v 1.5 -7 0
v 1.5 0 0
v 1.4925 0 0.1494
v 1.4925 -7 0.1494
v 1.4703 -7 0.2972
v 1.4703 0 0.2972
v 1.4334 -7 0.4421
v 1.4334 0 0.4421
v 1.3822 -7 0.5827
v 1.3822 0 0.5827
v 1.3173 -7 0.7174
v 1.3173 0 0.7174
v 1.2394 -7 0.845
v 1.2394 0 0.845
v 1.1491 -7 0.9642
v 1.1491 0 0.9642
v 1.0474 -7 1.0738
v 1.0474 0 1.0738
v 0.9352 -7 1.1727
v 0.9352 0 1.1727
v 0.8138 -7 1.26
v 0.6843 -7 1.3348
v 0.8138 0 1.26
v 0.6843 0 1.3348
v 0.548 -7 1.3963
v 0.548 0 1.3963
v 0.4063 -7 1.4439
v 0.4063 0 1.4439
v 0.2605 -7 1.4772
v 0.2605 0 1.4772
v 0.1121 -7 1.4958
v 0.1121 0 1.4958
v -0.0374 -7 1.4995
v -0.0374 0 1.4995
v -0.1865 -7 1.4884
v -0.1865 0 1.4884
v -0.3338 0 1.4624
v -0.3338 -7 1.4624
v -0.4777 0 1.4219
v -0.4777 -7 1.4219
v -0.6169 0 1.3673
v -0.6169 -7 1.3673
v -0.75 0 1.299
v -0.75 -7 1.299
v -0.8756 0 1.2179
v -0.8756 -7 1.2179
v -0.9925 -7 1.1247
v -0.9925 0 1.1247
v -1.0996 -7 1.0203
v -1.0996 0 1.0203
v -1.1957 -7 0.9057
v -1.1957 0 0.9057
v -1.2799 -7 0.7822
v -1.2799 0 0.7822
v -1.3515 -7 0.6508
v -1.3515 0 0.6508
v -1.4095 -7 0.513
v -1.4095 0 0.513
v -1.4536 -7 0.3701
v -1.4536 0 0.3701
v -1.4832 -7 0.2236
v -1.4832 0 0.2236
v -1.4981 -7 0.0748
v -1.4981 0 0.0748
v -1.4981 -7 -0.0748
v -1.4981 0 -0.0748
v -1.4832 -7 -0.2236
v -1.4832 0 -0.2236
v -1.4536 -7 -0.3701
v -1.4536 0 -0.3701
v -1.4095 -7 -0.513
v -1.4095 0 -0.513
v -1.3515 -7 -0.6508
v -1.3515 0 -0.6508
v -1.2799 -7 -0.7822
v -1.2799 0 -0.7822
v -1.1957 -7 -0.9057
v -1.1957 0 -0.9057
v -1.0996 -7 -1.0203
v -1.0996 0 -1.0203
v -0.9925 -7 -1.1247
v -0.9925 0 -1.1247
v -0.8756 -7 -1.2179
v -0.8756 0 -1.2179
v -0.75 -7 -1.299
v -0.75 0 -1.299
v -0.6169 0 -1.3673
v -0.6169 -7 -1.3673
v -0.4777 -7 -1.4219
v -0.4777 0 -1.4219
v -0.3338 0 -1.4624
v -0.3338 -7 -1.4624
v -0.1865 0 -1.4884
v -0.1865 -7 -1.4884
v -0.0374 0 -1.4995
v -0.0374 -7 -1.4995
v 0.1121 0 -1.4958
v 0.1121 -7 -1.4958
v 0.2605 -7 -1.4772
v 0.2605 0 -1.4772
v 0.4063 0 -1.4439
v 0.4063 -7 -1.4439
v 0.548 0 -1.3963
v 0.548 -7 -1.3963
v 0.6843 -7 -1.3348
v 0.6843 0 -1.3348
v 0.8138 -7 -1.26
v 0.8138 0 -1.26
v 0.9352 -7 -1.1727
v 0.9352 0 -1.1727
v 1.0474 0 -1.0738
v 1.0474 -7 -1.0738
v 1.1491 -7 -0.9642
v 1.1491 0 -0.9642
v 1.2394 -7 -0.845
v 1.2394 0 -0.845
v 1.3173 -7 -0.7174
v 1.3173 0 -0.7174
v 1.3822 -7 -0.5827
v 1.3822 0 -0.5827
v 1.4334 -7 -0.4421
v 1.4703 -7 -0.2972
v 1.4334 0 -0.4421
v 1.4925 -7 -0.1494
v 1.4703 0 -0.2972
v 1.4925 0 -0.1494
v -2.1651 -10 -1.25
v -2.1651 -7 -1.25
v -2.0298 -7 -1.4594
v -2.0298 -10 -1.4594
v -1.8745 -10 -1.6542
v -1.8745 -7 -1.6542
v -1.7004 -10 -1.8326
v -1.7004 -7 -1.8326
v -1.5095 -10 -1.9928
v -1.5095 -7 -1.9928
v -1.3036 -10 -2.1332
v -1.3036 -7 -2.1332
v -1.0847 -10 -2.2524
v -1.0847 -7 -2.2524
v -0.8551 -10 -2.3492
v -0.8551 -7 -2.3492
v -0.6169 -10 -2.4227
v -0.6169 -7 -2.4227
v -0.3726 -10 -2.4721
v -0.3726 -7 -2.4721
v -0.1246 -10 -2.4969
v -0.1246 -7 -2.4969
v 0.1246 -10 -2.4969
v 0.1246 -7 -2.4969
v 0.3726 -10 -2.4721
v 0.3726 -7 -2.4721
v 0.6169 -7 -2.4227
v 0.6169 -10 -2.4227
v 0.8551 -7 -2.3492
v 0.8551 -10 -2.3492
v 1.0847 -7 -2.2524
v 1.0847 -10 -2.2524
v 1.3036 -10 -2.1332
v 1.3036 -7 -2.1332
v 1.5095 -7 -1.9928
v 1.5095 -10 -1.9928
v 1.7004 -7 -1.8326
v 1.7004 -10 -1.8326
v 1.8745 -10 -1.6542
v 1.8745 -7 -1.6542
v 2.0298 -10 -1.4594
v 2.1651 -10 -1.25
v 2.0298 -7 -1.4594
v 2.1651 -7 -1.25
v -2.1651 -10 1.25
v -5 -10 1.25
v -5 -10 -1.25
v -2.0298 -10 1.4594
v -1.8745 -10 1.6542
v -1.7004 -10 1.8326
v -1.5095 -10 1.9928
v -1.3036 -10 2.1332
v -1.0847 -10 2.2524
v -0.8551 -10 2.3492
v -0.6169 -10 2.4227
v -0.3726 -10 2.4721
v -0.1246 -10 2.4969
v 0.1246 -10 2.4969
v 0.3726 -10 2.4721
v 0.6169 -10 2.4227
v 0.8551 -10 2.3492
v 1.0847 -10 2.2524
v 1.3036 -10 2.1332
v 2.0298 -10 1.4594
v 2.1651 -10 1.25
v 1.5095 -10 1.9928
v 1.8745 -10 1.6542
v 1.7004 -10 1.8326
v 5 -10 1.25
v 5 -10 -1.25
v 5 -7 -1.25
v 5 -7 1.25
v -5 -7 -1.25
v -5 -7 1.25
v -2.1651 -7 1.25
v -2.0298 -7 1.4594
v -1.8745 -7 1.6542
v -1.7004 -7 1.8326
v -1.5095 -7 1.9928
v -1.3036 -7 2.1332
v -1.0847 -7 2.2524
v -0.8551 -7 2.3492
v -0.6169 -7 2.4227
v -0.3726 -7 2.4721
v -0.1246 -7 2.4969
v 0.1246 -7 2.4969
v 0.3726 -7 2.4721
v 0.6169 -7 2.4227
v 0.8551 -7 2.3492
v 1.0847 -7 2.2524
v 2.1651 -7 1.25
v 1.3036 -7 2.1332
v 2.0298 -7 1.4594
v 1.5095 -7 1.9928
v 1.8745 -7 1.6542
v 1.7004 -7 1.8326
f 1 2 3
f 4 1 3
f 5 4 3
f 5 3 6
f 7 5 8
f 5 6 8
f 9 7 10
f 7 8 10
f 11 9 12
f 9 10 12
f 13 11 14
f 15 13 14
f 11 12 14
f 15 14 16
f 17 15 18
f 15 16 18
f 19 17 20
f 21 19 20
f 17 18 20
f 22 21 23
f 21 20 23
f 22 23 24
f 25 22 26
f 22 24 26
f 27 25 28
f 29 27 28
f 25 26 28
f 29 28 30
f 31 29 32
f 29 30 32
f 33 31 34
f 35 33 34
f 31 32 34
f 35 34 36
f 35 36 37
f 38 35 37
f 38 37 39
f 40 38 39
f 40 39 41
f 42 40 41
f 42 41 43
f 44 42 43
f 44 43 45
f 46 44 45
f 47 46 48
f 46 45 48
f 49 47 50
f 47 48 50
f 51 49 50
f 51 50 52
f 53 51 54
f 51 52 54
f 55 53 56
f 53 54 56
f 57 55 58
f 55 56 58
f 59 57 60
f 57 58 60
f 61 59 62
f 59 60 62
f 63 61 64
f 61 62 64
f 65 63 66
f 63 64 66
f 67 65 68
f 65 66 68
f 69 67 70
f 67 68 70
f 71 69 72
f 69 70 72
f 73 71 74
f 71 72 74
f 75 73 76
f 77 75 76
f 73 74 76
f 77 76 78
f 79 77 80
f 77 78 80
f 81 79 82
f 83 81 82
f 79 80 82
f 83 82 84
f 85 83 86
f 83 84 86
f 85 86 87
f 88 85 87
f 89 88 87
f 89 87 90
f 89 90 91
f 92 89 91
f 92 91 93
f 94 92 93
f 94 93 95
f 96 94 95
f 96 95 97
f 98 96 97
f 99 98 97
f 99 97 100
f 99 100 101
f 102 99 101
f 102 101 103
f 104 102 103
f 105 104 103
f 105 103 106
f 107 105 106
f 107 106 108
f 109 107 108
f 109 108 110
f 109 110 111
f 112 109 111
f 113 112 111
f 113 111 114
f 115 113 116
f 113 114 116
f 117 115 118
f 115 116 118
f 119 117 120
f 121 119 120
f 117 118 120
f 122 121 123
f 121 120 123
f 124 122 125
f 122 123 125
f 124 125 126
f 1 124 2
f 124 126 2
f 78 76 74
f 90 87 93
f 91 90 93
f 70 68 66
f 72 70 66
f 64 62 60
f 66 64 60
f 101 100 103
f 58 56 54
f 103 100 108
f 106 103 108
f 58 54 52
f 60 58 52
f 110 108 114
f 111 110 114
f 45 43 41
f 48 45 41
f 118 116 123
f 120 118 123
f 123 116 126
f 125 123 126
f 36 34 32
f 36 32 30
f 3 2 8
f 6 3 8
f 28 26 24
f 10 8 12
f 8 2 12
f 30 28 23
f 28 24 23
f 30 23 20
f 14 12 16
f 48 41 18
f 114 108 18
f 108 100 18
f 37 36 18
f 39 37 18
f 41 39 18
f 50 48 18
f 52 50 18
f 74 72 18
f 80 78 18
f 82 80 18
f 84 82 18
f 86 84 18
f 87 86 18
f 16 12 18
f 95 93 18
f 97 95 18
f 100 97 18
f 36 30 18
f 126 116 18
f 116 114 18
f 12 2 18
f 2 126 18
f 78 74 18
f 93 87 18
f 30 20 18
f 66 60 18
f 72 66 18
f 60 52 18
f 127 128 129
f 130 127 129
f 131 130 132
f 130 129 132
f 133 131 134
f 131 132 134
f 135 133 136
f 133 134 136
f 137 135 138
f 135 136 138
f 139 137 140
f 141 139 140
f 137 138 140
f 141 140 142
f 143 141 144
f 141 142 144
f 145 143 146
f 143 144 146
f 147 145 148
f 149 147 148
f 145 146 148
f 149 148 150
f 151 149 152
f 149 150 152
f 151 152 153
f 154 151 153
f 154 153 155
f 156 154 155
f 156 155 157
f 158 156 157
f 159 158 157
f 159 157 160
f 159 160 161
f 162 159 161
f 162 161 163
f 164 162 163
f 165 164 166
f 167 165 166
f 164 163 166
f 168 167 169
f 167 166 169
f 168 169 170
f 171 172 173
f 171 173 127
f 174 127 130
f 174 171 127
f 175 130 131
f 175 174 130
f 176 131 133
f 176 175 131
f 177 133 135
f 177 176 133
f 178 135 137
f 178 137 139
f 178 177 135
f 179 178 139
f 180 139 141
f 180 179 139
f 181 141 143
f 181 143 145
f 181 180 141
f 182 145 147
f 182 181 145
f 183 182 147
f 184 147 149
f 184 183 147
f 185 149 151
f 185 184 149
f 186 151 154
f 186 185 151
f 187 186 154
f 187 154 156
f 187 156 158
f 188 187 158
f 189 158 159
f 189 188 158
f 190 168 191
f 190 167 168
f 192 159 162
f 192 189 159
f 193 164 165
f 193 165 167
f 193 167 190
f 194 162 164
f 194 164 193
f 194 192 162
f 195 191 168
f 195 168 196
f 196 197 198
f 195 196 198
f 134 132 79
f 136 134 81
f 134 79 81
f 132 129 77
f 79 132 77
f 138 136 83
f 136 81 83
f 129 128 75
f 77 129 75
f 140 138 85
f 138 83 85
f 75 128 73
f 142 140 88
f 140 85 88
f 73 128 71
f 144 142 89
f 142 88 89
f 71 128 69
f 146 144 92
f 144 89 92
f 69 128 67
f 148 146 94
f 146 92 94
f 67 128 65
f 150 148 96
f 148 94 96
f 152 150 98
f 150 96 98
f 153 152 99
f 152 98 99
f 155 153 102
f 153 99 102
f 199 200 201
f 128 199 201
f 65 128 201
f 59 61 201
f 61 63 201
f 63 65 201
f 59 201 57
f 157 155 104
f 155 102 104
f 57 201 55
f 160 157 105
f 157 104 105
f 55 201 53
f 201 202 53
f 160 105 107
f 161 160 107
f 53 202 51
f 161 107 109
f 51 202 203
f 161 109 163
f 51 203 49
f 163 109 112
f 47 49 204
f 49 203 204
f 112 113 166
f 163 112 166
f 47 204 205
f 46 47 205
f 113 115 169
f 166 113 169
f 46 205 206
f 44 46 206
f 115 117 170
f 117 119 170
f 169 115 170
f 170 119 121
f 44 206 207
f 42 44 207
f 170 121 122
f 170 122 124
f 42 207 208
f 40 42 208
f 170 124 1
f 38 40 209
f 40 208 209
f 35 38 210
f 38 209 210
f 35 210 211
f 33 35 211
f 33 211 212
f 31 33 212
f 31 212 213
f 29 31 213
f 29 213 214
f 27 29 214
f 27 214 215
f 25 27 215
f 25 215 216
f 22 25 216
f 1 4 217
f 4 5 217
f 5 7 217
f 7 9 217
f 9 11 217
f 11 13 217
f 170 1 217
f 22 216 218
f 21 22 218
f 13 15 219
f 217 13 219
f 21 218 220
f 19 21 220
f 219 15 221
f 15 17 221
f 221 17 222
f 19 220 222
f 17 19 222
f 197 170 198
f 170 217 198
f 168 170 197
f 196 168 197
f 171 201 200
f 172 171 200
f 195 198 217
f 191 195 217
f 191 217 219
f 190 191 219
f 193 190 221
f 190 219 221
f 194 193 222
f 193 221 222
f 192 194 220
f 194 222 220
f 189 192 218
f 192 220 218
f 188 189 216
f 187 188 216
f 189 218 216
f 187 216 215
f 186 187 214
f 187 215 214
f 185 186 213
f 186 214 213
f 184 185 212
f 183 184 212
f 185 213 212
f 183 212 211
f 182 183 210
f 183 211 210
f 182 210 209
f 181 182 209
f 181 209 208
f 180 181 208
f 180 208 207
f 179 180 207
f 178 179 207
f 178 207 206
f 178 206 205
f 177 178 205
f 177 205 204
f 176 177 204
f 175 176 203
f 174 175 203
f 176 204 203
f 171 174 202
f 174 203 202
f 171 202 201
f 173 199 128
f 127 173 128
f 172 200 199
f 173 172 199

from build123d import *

# Parameters (mm, degrees)
F0_R     = 1.5
F1_DEPTH = 7
F3_DEPTH = 3


with BuildPart() as f1:
    # F0 (on Front) → F1 (new body)
    with BuildSketch(Plane.XZ):
        Circle(F0_R)
    extrude(amount=F1_DEPTH)

    # F2 (on face) → F3 (join)
    with BuildSketch(Plane.XZ.offset(7)):
        with BuildLine():
            ThreePointArc((2.1650635095, -1.25), (2.4148145657, -0.6470476128), (2.5, 0))
            ThreePointArc((2.5, 0), (2.4148145657, 0.6470476128), (2.1650635095, 1.25))
            Line((2.1650635095, 1.25), (-2.1650635095, 1.25))
            ThreePointArc((-2.1650635095, 1.25), (-2.5, 0), (-2.1650635095, -1.25))
            Line((-2.1650635095, -1.25), (2.1650635095, -1.25))
        make_face()
        with BuildLine():
            ThreePointArc((2.1650635095, 1.25), (2.4148145657, 0.6470476128), (2.5, 0))
            ThreePointArc((2.5, 0), (2.4148145657, -0.6470476128), (2.1650635095, -1.25))
            Line((2.1650635095, -1.25), (5, -1.25))
            Line((5, -1.25), (5, 1.25))
            Line((5, 1.25), (2.1650635095, 1.25))
        make_face()
        with BuildLine():
            Line((-2.1650635095, 1.25), (2.1650635095, 1.25))
            ThreePointArc((2.1650635095, 1.25), (0, 2.5), (-2.1650635095, 1.25))
        make_face()
        with BuildLine():
            ThreePointArc((-2.1650635095, -1.25), (0, -2.5), (2.1650635095, -1.25))
            Line((2.1650635095, -1.25), (-2.1650635095, -1.25))
        make_face()
        with BuildLine():
            ThreePointArc((-2.1650635095, -1.25), (-2.5, 0), (-2.1650635095, 1.25))
            Line((-2.1650635095, 1.25), (-5, 1.25))
            Line((-5, 1.25), (-5, -1.25))
            Line((-5, -1.25), (-2.1650635095, -1.25))
        make_face()
    extrude(amount=F3_DEPTH)


solid = f1.part
